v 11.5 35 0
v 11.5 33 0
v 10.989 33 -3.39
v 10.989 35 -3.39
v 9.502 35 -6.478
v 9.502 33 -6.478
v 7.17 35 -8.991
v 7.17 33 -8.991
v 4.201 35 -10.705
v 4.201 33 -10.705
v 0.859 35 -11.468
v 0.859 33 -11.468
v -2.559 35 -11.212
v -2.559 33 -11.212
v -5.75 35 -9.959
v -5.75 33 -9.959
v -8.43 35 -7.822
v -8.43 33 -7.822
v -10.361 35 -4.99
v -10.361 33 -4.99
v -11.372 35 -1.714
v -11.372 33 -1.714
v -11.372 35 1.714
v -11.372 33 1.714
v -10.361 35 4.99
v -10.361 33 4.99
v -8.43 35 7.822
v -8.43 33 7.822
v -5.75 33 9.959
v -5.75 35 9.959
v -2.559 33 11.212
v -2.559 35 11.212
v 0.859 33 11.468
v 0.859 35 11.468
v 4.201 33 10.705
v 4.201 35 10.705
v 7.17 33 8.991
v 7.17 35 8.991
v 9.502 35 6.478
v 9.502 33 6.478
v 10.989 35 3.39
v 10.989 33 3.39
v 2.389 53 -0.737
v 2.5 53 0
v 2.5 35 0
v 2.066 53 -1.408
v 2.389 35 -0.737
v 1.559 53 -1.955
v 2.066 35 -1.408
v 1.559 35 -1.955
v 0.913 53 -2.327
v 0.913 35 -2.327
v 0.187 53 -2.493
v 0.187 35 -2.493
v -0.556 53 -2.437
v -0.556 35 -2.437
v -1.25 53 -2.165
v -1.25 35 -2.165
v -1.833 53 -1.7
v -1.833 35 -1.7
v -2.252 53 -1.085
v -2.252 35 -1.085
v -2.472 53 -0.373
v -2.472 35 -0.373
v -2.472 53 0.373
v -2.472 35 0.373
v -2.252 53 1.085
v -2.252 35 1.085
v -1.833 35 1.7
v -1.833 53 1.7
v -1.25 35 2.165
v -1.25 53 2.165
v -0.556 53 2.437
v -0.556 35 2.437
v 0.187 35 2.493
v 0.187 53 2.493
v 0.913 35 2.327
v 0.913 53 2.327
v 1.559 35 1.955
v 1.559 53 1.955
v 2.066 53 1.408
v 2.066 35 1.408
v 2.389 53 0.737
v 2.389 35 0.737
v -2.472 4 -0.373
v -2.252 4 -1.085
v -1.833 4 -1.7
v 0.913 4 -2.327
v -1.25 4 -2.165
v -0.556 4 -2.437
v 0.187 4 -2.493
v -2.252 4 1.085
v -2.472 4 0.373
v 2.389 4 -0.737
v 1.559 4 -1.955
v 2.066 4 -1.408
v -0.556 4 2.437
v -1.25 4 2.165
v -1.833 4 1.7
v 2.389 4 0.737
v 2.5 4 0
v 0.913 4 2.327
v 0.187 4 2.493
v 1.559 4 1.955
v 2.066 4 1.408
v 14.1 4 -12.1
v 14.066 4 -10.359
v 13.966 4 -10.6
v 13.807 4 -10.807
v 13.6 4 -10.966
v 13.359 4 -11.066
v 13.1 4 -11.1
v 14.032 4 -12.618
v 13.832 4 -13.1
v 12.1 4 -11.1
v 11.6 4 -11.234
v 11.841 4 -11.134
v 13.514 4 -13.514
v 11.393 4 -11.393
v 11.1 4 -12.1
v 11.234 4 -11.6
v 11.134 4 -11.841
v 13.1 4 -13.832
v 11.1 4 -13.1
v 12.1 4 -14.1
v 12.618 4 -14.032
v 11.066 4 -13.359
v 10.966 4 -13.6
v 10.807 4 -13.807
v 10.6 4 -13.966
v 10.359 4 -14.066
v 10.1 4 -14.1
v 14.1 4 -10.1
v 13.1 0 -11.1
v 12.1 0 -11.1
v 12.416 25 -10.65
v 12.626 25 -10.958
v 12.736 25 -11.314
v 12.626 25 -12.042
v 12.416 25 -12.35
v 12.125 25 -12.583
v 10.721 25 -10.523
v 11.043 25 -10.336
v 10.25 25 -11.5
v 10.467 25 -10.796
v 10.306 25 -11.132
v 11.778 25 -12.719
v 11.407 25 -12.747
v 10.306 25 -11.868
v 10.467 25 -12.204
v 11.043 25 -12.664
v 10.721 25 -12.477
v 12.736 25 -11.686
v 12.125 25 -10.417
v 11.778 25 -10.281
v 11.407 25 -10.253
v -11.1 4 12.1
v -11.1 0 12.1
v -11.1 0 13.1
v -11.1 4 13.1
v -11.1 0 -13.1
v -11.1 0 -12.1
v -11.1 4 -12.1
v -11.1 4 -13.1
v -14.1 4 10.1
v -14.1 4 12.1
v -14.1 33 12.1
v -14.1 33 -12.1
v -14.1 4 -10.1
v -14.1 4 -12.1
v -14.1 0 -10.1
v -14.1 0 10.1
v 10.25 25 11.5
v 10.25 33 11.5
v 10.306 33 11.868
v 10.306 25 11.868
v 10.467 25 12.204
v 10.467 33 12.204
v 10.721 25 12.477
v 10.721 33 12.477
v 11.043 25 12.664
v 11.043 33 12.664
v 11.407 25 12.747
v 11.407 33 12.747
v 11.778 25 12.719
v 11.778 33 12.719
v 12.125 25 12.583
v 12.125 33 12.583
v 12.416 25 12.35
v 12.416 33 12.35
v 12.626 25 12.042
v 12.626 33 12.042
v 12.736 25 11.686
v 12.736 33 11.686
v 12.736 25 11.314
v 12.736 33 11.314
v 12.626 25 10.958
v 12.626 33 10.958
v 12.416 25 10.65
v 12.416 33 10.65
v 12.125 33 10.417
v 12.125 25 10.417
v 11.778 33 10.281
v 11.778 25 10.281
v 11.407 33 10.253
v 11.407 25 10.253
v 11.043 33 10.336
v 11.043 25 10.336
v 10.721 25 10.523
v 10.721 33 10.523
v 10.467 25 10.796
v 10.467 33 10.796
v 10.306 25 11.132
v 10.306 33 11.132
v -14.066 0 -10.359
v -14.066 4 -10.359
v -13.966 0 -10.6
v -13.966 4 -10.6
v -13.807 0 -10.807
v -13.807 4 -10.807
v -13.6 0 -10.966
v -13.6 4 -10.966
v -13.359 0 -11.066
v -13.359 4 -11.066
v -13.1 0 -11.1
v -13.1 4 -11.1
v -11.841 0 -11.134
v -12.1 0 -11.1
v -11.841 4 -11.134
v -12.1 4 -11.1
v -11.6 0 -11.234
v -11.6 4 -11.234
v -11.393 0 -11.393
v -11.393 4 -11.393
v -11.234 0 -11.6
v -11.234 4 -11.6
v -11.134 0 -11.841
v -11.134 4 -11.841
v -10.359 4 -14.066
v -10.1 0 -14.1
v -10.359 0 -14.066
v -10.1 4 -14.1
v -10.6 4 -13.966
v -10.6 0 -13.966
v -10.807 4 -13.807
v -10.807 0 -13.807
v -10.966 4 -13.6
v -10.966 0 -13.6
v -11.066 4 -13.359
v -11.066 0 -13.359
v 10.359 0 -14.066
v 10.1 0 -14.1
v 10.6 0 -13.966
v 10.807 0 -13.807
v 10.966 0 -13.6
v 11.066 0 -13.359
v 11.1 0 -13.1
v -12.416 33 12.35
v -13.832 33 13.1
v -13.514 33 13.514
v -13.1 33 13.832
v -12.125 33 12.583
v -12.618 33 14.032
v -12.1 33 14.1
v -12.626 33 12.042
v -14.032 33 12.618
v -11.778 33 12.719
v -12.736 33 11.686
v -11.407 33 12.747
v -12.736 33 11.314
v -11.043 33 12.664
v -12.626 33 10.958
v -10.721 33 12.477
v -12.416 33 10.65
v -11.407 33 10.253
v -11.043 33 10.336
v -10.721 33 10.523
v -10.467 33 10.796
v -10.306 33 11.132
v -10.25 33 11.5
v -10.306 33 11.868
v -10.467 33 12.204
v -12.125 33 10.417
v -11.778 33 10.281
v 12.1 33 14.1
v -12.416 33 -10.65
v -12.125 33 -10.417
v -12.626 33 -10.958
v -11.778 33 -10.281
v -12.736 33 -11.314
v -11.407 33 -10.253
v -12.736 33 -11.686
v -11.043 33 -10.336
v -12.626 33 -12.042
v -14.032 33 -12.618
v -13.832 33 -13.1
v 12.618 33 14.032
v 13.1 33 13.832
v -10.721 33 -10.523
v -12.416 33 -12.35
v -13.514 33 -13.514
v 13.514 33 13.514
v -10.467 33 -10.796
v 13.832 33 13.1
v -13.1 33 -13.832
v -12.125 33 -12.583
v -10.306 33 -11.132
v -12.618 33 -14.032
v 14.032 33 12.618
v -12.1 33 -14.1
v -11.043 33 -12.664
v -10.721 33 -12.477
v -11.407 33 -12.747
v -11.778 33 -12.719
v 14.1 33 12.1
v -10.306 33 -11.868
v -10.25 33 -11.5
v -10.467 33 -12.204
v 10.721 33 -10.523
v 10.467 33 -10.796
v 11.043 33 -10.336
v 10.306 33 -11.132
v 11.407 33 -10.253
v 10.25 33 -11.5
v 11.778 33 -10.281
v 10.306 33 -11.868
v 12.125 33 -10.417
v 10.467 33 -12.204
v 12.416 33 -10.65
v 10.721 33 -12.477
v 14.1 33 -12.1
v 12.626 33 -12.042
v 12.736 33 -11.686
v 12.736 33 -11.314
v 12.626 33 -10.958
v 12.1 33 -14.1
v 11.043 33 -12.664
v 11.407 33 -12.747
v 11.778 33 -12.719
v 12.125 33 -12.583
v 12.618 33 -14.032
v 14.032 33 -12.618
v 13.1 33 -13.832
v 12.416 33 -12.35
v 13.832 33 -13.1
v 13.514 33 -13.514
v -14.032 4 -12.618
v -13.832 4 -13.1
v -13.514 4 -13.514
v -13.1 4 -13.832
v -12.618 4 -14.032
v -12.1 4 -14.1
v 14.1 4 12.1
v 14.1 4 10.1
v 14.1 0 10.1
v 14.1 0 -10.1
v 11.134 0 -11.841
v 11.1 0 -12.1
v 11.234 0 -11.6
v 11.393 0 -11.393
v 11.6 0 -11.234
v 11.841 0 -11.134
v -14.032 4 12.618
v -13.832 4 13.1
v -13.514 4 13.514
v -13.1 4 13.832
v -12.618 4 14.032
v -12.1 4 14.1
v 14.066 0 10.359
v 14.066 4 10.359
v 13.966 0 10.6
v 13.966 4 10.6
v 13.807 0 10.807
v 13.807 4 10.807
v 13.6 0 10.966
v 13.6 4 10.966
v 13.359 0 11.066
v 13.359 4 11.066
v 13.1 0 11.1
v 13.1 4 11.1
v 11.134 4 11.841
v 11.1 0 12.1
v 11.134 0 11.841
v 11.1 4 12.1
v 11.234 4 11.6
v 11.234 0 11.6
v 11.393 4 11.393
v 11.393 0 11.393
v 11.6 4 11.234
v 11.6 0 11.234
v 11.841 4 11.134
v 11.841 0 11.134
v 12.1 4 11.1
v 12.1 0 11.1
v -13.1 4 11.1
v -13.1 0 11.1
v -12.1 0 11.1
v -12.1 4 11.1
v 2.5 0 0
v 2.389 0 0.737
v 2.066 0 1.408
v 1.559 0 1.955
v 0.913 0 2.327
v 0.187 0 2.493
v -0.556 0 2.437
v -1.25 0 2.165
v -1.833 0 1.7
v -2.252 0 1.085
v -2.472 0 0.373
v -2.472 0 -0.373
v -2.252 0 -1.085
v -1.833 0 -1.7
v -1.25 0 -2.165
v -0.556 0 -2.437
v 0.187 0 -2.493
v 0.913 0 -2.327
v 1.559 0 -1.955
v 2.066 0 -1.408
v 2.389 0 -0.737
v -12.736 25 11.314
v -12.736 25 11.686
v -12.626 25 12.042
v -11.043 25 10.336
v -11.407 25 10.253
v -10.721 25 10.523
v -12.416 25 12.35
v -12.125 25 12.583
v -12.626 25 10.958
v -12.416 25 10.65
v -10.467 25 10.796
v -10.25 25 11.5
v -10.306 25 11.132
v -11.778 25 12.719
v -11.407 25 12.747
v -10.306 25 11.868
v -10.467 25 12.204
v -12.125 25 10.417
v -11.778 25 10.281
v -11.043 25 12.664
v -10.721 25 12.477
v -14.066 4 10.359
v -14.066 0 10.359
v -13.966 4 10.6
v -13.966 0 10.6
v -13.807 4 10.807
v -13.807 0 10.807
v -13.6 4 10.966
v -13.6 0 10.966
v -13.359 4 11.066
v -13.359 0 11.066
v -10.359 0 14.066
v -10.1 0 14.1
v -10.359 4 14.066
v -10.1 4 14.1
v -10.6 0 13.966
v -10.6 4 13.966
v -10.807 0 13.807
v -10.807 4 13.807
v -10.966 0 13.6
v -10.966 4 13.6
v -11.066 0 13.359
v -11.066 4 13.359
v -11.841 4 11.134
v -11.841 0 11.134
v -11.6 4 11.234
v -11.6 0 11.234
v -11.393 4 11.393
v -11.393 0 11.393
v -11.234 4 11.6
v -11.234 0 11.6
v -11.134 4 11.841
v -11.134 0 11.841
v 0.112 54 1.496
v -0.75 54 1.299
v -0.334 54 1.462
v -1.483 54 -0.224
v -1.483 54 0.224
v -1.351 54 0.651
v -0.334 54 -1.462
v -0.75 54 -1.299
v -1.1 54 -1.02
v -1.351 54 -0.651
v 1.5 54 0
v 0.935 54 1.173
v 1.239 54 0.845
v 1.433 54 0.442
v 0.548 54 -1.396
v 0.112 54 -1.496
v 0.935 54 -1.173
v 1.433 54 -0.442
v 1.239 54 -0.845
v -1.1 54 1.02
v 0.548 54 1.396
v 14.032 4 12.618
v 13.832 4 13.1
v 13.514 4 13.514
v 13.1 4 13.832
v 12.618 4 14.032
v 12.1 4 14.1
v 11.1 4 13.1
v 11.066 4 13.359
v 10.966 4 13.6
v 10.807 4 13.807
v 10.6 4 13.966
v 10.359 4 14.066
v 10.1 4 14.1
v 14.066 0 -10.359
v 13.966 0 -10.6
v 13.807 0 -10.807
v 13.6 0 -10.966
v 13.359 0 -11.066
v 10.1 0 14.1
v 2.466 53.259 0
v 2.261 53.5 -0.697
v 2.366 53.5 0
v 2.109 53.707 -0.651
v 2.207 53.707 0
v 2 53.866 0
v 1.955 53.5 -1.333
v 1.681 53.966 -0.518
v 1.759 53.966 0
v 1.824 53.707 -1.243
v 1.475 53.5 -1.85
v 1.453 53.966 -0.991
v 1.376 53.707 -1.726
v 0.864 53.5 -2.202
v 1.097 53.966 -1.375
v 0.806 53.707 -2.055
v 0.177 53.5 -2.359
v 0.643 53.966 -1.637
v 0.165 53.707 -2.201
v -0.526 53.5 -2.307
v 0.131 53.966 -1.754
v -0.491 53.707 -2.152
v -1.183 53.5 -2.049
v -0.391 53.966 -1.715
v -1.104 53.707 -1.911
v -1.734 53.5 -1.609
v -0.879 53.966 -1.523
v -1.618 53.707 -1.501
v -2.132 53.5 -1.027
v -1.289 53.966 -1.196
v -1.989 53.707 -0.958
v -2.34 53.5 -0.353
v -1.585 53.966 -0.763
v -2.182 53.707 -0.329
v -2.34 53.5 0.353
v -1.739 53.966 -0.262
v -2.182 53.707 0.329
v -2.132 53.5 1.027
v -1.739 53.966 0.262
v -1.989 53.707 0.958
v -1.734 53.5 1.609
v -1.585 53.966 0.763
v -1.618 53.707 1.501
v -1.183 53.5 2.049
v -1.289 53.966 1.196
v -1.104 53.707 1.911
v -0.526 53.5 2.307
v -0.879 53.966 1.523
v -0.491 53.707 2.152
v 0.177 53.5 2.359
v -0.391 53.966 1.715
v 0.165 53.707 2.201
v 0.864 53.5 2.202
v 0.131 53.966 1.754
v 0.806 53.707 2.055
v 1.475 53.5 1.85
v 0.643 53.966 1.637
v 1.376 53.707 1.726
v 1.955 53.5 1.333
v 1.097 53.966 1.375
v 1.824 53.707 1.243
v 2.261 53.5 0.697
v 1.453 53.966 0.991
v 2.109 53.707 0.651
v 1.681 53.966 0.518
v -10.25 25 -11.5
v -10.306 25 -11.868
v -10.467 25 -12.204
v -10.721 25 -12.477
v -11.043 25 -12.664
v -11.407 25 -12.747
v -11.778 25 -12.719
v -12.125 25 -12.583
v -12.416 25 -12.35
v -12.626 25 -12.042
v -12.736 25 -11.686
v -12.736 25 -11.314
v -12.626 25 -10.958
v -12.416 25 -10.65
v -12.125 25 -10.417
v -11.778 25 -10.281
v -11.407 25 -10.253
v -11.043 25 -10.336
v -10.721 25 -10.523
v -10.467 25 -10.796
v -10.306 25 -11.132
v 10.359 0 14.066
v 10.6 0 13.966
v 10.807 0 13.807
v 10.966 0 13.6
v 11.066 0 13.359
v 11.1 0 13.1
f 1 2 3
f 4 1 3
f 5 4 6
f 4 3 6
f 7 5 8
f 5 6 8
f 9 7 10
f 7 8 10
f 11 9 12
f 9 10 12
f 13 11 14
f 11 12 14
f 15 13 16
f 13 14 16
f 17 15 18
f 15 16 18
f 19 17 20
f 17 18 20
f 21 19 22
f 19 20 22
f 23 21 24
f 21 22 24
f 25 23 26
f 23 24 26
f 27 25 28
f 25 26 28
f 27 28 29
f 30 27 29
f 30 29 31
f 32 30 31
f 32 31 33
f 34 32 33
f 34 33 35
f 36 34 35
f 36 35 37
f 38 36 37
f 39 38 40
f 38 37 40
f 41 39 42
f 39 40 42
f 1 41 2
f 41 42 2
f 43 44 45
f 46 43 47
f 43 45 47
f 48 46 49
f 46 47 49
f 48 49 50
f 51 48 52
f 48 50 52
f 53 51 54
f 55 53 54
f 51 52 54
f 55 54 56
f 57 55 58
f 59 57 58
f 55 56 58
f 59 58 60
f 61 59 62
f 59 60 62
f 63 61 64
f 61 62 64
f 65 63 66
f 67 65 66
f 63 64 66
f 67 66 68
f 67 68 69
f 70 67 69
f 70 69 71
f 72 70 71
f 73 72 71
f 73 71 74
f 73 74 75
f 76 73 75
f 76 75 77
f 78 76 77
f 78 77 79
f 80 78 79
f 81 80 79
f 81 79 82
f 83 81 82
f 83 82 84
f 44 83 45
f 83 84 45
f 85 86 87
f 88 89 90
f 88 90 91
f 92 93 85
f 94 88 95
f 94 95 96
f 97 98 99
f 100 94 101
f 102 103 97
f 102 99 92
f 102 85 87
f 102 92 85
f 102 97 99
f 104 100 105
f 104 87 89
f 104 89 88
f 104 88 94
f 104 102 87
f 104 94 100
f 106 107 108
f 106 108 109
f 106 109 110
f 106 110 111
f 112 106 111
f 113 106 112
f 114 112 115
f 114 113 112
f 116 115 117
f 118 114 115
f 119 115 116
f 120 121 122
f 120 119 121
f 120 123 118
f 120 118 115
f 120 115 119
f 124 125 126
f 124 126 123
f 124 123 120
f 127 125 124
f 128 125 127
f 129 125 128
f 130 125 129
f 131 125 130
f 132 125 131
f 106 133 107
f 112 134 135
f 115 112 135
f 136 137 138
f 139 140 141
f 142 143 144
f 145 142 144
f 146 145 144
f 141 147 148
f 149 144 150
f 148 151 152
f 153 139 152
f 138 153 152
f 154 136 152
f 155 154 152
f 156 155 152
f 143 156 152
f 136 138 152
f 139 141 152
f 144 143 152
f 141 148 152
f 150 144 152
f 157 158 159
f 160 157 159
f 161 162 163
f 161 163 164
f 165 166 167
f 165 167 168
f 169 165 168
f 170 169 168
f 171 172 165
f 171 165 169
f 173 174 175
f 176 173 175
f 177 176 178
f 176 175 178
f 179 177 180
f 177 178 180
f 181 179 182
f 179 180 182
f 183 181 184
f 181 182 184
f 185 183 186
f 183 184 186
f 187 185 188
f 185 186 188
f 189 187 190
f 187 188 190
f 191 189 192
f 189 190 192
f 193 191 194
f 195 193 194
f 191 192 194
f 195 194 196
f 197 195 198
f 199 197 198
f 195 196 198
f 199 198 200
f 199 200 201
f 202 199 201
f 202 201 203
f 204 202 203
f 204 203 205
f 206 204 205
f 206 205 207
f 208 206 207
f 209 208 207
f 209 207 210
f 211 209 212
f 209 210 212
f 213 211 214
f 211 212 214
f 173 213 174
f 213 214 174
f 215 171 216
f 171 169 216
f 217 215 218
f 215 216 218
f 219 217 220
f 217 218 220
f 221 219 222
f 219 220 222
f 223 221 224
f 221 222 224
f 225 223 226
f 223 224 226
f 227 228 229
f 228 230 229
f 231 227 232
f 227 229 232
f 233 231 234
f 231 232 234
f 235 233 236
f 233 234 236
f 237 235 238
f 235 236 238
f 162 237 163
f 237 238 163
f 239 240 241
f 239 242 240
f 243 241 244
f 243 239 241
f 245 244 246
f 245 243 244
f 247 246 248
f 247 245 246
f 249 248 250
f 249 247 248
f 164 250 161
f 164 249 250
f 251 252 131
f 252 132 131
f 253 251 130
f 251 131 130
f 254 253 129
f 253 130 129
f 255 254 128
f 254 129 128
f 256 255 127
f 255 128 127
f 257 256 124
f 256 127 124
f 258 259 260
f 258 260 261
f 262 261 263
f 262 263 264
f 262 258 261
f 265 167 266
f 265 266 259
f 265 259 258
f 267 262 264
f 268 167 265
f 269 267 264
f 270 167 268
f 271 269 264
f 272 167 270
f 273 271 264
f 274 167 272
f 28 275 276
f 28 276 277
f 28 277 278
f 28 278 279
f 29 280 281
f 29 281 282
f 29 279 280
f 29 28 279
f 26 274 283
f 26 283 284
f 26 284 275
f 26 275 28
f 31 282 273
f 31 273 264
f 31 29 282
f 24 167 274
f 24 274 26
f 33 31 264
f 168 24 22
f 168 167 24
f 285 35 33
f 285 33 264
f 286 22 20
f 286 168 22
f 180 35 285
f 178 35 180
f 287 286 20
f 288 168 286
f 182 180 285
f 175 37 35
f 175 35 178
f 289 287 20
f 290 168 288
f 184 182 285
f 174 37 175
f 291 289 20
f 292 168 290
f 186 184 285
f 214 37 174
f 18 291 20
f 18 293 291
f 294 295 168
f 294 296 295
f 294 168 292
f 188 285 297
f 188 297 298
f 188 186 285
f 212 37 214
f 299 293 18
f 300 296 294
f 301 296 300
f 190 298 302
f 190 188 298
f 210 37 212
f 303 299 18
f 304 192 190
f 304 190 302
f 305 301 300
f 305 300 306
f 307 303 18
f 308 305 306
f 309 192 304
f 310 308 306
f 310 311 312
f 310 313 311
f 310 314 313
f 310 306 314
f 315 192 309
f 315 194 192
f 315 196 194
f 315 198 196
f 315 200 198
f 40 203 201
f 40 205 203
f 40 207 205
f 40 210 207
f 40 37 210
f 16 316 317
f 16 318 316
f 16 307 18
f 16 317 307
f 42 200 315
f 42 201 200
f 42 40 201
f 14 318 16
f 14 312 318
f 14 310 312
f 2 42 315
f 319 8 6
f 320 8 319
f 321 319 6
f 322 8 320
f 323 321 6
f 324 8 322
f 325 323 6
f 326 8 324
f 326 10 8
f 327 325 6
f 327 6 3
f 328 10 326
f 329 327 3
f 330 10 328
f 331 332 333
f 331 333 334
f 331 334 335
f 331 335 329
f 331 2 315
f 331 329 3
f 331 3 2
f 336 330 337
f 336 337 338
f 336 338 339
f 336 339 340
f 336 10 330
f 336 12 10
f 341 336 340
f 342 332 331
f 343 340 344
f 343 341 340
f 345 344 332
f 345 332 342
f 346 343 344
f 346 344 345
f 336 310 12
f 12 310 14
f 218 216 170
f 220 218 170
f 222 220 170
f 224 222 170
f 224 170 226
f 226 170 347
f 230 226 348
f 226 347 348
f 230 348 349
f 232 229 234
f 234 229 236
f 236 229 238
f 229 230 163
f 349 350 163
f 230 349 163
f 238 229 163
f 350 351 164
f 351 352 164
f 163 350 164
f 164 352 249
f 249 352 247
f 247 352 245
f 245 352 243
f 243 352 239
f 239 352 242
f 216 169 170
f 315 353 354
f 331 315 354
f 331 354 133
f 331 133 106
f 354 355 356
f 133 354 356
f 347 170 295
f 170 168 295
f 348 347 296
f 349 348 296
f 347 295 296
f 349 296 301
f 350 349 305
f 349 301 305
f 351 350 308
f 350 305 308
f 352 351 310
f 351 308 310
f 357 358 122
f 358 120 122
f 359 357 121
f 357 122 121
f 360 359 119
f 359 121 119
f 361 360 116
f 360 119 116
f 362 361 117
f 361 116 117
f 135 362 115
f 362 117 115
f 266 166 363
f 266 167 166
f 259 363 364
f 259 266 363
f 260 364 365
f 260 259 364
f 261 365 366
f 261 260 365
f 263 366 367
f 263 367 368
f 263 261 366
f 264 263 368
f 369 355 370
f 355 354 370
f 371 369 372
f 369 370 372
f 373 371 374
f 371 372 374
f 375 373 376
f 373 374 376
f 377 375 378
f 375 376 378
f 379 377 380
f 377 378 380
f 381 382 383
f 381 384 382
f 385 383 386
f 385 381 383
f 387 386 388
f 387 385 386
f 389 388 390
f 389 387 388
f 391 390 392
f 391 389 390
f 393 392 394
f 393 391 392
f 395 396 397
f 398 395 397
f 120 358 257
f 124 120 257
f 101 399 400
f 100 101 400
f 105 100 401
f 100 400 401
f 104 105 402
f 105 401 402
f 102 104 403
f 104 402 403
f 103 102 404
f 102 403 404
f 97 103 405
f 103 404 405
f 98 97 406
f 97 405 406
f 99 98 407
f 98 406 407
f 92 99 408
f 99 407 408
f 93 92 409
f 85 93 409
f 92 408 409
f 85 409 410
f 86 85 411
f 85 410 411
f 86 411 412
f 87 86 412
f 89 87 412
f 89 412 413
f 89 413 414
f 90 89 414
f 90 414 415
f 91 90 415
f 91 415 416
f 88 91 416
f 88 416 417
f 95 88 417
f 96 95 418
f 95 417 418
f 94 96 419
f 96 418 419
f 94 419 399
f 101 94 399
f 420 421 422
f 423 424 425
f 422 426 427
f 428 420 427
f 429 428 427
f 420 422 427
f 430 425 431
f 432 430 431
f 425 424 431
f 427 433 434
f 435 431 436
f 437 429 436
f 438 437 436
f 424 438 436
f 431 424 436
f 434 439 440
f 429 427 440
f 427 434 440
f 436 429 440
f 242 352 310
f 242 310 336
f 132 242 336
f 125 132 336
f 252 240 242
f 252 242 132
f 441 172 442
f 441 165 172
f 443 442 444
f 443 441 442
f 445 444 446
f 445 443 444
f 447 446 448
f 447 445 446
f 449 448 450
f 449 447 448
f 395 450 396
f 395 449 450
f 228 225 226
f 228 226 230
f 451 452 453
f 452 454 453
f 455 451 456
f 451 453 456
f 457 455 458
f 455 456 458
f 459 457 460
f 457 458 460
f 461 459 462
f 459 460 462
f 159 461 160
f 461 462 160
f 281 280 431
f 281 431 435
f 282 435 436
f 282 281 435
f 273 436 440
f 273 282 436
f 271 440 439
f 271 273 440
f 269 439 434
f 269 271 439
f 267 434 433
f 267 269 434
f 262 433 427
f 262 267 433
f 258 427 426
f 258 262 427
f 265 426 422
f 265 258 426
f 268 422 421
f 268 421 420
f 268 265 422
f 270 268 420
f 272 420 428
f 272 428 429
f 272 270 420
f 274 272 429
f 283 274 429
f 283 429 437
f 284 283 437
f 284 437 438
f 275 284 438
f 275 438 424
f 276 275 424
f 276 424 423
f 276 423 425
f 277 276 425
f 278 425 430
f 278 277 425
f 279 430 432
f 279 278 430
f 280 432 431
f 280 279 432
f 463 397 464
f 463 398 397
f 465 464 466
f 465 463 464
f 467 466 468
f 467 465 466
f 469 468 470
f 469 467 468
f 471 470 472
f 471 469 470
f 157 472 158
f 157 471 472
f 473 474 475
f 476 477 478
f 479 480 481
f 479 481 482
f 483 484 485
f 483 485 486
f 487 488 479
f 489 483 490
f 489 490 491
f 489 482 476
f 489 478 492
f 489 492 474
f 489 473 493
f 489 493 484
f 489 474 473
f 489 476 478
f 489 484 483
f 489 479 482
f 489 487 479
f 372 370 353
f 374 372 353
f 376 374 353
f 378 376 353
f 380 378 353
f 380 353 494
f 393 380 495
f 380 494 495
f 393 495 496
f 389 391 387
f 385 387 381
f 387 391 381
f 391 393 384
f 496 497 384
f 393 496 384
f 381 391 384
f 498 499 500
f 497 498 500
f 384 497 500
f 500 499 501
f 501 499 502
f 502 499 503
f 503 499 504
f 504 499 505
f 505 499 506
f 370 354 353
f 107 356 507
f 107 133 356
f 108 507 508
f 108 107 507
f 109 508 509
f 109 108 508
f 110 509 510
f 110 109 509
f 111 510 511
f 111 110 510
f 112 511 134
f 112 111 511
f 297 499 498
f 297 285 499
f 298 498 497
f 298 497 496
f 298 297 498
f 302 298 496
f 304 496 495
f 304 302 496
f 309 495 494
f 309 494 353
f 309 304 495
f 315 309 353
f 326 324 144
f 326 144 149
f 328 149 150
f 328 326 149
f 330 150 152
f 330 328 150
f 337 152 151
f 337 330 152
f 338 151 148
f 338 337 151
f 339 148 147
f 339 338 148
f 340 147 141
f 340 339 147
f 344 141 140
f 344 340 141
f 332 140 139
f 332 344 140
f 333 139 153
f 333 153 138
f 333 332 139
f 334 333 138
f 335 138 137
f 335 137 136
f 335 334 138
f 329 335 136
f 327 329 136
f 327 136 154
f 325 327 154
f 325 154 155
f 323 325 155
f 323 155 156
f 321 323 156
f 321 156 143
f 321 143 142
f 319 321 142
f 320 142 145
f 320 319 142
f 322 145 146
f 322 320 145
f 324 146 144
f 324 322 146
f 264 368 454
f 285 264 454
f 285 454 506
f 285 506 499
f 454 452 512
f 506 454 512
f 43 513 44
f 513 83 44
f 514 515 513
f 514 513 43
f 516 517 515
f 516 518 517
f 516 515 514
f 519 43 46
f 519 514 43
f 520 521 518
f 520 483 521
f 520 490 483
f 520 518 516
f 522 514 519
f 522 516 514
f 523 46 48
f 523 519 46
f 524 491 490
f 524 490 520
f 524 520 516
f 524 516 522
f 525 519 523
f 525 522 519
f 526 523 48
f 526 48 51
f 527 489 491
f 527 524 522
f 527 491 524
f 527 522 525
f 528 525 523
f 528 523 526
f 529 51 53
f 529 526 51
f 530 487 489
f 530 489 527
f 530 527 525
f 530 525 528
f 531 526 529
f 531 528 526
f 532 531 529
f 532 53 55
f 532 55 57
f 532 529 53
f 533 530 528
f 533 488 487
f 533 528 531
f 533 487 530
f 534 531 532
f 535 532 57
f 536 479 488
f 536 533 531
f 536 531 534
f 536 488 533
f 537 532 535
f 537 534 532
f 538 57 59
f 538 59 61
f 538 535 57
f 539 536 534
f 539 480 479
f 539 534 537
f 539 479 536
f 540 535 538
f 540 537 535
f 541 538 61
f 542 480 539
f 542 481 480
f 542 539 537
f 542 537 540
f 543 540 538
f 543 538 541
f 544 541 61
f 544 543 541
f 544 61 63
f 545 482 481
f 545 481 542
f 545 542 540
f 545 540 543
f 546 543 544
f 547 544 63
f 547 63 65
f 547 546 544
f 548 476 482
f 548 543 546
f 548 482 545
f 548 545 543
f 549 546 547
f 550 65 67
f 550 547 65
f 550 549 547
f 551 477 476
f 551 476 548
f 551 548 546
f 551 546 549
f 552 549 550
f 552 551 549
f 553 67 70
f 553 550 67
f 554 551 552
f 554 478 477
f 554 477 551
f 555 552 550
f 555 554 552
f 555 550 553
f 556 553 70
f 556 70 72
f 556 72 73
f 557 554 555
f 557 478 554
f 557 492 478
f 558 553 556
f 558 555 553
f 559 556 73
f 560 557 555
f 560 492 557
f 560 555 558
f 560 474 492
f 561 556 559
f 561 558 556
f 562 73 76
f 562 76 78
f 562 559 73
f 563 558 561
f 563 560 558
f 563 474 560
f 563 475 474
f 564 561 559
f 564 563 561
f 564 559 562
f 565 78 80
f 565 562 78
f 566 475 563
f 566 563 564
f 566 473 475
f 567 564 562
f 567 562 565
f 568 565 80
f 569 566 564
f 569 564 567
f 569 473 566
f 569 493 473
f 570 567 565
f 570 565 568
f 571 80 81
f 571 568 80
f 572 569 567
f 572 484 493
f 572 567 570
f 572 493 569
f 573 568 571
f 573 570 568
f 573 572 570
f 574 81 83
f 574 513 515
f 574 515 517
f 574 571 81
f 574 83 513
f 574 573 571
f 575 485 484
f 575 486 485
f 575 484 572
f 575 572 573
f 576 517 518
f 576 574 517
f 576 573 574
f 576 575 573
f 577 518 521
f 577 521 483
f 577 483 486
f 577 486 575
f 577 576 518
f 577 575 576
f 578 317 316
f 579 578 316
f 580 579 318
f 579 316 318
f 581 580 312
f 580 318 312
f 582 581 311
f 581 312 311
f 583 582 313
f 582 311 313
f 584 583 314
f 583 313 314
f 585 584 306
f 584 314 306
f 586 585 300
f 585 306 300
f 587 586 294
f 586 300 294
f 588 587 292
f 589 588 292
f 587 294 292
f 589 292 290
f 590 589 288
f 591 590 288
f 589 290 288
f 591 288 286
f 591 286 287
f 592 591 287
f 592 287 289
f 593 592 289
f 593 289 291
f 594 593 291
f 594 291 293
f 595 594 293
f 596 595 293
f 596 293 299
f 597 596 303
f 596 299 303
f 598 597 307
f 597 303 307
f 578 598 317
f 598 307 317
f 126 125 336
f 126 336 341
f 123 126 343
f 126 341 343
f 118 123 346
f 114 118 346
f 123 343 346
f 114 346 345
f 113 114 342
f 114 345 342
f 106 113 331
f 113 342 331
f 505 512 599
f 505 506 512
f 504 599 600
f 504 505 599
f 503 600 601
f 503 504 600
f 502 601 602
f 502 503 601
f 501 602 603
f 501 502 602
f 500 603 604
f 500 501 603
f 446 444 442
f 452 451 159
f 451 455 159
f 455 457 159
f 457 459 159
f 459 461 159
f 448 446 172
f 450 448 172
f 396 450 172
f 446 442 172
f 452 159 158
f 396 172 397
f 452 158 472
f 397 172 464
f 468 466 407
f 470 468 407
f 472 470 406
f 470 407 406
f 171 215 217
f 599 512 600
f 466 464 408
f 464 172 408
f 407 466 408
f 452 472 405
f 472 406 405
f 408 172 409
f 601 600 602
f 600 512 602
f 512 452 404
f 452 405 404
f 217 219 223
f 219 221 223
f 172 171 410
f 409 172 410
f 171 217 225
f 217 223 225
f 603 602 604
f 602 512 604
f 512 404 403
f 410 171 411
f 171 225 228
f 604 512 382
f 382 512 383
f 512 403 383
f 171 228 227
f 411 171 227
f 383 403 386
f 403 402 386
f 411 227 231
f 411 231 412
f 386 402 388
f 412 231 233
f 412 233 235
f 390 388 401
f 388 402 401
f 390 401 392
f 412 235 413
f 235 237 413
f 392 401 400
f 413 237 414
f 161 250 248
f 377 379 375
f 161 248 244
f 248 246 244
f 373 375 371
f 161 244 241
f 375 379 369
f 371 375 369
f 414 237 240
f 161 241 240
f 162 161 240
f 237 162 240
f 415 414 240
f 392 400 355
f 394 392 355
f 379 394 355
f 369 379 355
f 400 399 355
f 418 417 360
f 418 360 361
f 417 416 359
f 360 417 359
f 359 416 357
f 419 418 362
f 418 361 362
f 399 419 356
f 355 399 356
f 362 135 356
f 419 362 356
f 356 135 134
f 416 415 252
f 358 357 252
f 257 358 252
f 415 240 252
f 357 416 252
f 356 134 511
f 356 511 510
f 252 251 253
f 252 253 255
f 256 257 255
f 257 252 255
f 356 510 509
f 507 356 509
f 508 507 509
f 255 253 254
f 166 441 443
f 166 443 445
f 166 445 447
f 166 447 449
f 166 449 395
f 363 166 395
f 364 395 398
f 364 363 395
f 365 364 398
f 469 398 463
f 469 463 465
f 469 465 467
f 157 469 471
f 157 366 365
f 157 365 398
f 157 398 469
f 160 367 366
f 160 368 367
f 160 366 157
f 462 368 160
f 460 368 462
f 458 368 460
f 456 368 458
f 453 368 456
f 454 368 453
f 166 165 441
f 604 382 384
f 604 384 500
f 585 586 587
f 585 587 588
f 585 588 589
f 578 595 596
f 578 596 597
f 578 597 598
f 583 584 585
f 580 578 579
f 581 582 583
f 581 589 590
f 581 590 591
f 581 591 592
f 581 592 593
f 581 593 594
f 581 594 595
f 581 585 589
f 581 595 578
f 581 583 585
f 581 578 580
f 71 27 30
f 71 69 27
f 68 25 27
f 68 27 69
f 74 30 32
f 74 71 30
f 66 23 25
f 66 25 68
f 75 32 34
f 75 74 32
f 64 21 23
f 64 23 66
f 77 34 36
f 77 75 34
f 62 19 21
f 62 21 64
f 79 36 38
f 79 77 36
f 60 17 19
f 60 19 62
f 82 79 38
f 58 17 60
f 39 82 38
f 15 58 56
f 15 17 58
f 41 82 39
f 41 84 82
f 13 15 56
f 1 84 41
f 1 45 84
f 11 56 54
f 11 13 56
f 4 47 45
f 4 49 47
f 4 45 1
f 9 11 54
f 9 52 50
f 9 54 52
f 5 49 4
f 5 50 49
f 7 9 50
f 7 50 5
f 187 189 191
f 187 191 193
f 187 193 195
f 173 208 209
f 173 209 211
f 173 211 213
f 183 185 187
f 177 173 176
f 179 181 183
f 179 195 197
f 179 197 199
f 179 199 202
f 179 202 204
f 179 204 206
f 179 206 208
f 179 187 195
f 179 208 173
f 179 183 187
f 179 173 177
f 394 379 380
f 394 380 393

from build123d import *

# Parameters (mm, degrees)
SKETCH1_W               = 28.2
SKETCH1_H               = 28.2
BOSS_EXTRUDE1_DEPTH     = 33
SKETCH2_R               = 11.5
BOSS_EXTRUDE2_DEPTH     = 2
SKETCH3_R               = 2.5
BOSS_EXTRUDE3_DEPTH     = 19
SKETCH4_R               = 1.25
CUT_EXTRUDE1_DEPTH      = 8
MIRROR2_COPY_1_SKETCH_R = 1.25
MIRROR2_COPY_1_DEPTH    = 8
SKETCH5_W               = 3
SKETCH5_H               = 3
CUT_EXTRUDE2_DEPTH      = 4
MIRROR4_COPY_1_SKETCH_W = 3
MIRROR4_COPY_1_SKETCH_H = 3
MIRROR4_COPY_1_DEPTH    = 4
SKETCH6_R               = 2.5
CUT_EXTRUDE3_DEPTH      = 4
FILLET1_R               = 2
FILLET2_R               = 1
FILLET3_R               = 1


with BuildPart() as part:
    # Sketch1 → Boss-Extrude1 (new body)
    with BuildSketch(Plane(origin=(0, 0, 0), x_dir=(1, 0, 0), z_dir=(0, 1, 0))):
        Rectangle(SKETCH1_W, SKETCH1_H)
    extrude(amount=BOSS_EXTRUDE1_DEPTH)

    # Sketch2 → Boss-Extrude2 (add)
    with BuildSketch(Plane(origin=(0, 33, 0), x_dir=(1, 0, 0), z_dir=(0, 1, 0))):
        Circle(SKETCH2_R)
    extrude(amount=BOSS_EXTRUDE2_DEPTH)

    # Sketch3 → Boss-Extrude3 (add)
    with BuildSketch(Plane(origin=(0, 35, 0), x_dir=(1, 0, 0), z_dir=(0, 1, 0))):
        Circle(SKETCH3_R)
    extrude(amount=BOSS_EXTRUDE3_DEPTH)

    # Sketch4 → Cut-Extrude1 (cut)
    with BuildSketch(Plane(origin=(0, 33, 0), x_dir=(1, 0, 0), z_dir=(0, 1, 0))):
        with Locations((-11.5, 11.5)):
            Circle(SKETCH4_R)
    cut_extrude1 = extrude(amount=-CUT_EXTRUDE1_DEPTH, mode=Mode.SUBTRACT)

    # Mirror1: Cut-Extrude1 across plane
    add(cut_extrude1.mirror(Plane(origin=(0, 0, 0), x_dir=(0, 0, 1), z_dir=(1, 0, 0))), mode=Mode.SUBTRACT)

    # Mirror2: Cut-Extrude1 across plane
    add(cut_extrude1.mirror(Plane.XY), mode=Mode.SUBTRACT)

    # Mirror2 copy 1 sketch → Mirror2 copy 1 (cut)
    with BuildSketch(Plane(origin=(0, 33, 0), x_dir=(-1, 0, 0), z_dir=(0, 1, 0))):
        with Locations((-11.5, 11.5)):
            Circle(MIRROR2_COPY_1_SKETCH_R)
    extrude(amount=-MIRROR2_COPY_1_DEPTH, mode=Mode.SUBTRACT)

    # Sketch5 → Cut-Extrude2 (cut)
    with BuildSketch(Plane.XZ):
        with Locations((-12.6, 12.6)):
            Rectangle(SKETCH5_W, SKETCH5_H)
    cut_extrude2 = extrude(amount=-CUT_EXTRUDE2_DEPTH, mode=Mode.SUBTRACT)

    # Mirror3: Cut-Extrude2 across plane
    add(cut_extrude2.mirror(Plane(origin=(0, 0, 0), x_dir=(0, 0, 1), z_dir=(1, 0, 0))), mode=Mode.SUBTRACT)

    # Mirror4: Cut-Extrude2 across plane
    add(cut_extrude2.mirror(Plane.XY), mode=Mode.SUBTRACT)

    # Mirror4 copy 1 sketch → Mirror4 copy 1 (cut)
    with BuildSketch(Plane(origin=(0, 0, 0), x_dir=(-1, 0, 0), z_dir=(0, -1, 0))):
        with Locations((-12.6, 12.6)):
            Rectangle(MIRROR4_COPY_1_SKETCH_W, MIRROR4_COPY_1_SKETCH_H)
    extrude(amount=-MIRROR4_COPY_1_DEPTH, mode=Mode.SUBTRACT)

    # Sketch6 → Cut-Extrude3 (cut)
    with BuildSketch(Plane.XZ):
        Circle(SKETCH6_R)
    extrude(amount=-CUT_EXTRUDE3_DEPTH, mode=Mode.SUBTRACT)

    # Fillet1
    fillet1_edges = [part.edges().sort_by_distance(p)[0] for p in [
        (14.1, 18.5, 14.1),
        (-14.1, 18.5, 14.1),
        (-14.1, 18.5, -14.1),
        (14.1, 18.5, -14.1),
    ]]
    fillet(fillet1_edges, radius=FILLET1_R)

    # Fillet2
    fillet2_edges = [part.edges().sort_by_distance(p)[0] for p in [
        (-14.1, 2, 11.1),
        (-11.1, 2, 14.1),
        (-11.1, 2, 11.1),
        (14.1, 2, 11.1),
        (11.1, 2, 11.1),
        (11.1, 2, 14.1),
        (-14.1, 2, -11.1),
        (-11.1, 2, -11.1),
        (-11.1, 2, -14.1),
        (14.1, 2, -11.1),
        (11.1, 2, -14.1),
        (11.1, 2, -11.1),
    ]]
    fillet(fillet2_edges, radius=FILLET2_R)

    # Fillet3
    fillet3_edges = [part.edges().sort_by_distance(p)[0] for p in [
        (-2.5, 54, 0),
    ]]
    fillet(fillet3_edges, radius=FILLET3_R)


solid = part.part
